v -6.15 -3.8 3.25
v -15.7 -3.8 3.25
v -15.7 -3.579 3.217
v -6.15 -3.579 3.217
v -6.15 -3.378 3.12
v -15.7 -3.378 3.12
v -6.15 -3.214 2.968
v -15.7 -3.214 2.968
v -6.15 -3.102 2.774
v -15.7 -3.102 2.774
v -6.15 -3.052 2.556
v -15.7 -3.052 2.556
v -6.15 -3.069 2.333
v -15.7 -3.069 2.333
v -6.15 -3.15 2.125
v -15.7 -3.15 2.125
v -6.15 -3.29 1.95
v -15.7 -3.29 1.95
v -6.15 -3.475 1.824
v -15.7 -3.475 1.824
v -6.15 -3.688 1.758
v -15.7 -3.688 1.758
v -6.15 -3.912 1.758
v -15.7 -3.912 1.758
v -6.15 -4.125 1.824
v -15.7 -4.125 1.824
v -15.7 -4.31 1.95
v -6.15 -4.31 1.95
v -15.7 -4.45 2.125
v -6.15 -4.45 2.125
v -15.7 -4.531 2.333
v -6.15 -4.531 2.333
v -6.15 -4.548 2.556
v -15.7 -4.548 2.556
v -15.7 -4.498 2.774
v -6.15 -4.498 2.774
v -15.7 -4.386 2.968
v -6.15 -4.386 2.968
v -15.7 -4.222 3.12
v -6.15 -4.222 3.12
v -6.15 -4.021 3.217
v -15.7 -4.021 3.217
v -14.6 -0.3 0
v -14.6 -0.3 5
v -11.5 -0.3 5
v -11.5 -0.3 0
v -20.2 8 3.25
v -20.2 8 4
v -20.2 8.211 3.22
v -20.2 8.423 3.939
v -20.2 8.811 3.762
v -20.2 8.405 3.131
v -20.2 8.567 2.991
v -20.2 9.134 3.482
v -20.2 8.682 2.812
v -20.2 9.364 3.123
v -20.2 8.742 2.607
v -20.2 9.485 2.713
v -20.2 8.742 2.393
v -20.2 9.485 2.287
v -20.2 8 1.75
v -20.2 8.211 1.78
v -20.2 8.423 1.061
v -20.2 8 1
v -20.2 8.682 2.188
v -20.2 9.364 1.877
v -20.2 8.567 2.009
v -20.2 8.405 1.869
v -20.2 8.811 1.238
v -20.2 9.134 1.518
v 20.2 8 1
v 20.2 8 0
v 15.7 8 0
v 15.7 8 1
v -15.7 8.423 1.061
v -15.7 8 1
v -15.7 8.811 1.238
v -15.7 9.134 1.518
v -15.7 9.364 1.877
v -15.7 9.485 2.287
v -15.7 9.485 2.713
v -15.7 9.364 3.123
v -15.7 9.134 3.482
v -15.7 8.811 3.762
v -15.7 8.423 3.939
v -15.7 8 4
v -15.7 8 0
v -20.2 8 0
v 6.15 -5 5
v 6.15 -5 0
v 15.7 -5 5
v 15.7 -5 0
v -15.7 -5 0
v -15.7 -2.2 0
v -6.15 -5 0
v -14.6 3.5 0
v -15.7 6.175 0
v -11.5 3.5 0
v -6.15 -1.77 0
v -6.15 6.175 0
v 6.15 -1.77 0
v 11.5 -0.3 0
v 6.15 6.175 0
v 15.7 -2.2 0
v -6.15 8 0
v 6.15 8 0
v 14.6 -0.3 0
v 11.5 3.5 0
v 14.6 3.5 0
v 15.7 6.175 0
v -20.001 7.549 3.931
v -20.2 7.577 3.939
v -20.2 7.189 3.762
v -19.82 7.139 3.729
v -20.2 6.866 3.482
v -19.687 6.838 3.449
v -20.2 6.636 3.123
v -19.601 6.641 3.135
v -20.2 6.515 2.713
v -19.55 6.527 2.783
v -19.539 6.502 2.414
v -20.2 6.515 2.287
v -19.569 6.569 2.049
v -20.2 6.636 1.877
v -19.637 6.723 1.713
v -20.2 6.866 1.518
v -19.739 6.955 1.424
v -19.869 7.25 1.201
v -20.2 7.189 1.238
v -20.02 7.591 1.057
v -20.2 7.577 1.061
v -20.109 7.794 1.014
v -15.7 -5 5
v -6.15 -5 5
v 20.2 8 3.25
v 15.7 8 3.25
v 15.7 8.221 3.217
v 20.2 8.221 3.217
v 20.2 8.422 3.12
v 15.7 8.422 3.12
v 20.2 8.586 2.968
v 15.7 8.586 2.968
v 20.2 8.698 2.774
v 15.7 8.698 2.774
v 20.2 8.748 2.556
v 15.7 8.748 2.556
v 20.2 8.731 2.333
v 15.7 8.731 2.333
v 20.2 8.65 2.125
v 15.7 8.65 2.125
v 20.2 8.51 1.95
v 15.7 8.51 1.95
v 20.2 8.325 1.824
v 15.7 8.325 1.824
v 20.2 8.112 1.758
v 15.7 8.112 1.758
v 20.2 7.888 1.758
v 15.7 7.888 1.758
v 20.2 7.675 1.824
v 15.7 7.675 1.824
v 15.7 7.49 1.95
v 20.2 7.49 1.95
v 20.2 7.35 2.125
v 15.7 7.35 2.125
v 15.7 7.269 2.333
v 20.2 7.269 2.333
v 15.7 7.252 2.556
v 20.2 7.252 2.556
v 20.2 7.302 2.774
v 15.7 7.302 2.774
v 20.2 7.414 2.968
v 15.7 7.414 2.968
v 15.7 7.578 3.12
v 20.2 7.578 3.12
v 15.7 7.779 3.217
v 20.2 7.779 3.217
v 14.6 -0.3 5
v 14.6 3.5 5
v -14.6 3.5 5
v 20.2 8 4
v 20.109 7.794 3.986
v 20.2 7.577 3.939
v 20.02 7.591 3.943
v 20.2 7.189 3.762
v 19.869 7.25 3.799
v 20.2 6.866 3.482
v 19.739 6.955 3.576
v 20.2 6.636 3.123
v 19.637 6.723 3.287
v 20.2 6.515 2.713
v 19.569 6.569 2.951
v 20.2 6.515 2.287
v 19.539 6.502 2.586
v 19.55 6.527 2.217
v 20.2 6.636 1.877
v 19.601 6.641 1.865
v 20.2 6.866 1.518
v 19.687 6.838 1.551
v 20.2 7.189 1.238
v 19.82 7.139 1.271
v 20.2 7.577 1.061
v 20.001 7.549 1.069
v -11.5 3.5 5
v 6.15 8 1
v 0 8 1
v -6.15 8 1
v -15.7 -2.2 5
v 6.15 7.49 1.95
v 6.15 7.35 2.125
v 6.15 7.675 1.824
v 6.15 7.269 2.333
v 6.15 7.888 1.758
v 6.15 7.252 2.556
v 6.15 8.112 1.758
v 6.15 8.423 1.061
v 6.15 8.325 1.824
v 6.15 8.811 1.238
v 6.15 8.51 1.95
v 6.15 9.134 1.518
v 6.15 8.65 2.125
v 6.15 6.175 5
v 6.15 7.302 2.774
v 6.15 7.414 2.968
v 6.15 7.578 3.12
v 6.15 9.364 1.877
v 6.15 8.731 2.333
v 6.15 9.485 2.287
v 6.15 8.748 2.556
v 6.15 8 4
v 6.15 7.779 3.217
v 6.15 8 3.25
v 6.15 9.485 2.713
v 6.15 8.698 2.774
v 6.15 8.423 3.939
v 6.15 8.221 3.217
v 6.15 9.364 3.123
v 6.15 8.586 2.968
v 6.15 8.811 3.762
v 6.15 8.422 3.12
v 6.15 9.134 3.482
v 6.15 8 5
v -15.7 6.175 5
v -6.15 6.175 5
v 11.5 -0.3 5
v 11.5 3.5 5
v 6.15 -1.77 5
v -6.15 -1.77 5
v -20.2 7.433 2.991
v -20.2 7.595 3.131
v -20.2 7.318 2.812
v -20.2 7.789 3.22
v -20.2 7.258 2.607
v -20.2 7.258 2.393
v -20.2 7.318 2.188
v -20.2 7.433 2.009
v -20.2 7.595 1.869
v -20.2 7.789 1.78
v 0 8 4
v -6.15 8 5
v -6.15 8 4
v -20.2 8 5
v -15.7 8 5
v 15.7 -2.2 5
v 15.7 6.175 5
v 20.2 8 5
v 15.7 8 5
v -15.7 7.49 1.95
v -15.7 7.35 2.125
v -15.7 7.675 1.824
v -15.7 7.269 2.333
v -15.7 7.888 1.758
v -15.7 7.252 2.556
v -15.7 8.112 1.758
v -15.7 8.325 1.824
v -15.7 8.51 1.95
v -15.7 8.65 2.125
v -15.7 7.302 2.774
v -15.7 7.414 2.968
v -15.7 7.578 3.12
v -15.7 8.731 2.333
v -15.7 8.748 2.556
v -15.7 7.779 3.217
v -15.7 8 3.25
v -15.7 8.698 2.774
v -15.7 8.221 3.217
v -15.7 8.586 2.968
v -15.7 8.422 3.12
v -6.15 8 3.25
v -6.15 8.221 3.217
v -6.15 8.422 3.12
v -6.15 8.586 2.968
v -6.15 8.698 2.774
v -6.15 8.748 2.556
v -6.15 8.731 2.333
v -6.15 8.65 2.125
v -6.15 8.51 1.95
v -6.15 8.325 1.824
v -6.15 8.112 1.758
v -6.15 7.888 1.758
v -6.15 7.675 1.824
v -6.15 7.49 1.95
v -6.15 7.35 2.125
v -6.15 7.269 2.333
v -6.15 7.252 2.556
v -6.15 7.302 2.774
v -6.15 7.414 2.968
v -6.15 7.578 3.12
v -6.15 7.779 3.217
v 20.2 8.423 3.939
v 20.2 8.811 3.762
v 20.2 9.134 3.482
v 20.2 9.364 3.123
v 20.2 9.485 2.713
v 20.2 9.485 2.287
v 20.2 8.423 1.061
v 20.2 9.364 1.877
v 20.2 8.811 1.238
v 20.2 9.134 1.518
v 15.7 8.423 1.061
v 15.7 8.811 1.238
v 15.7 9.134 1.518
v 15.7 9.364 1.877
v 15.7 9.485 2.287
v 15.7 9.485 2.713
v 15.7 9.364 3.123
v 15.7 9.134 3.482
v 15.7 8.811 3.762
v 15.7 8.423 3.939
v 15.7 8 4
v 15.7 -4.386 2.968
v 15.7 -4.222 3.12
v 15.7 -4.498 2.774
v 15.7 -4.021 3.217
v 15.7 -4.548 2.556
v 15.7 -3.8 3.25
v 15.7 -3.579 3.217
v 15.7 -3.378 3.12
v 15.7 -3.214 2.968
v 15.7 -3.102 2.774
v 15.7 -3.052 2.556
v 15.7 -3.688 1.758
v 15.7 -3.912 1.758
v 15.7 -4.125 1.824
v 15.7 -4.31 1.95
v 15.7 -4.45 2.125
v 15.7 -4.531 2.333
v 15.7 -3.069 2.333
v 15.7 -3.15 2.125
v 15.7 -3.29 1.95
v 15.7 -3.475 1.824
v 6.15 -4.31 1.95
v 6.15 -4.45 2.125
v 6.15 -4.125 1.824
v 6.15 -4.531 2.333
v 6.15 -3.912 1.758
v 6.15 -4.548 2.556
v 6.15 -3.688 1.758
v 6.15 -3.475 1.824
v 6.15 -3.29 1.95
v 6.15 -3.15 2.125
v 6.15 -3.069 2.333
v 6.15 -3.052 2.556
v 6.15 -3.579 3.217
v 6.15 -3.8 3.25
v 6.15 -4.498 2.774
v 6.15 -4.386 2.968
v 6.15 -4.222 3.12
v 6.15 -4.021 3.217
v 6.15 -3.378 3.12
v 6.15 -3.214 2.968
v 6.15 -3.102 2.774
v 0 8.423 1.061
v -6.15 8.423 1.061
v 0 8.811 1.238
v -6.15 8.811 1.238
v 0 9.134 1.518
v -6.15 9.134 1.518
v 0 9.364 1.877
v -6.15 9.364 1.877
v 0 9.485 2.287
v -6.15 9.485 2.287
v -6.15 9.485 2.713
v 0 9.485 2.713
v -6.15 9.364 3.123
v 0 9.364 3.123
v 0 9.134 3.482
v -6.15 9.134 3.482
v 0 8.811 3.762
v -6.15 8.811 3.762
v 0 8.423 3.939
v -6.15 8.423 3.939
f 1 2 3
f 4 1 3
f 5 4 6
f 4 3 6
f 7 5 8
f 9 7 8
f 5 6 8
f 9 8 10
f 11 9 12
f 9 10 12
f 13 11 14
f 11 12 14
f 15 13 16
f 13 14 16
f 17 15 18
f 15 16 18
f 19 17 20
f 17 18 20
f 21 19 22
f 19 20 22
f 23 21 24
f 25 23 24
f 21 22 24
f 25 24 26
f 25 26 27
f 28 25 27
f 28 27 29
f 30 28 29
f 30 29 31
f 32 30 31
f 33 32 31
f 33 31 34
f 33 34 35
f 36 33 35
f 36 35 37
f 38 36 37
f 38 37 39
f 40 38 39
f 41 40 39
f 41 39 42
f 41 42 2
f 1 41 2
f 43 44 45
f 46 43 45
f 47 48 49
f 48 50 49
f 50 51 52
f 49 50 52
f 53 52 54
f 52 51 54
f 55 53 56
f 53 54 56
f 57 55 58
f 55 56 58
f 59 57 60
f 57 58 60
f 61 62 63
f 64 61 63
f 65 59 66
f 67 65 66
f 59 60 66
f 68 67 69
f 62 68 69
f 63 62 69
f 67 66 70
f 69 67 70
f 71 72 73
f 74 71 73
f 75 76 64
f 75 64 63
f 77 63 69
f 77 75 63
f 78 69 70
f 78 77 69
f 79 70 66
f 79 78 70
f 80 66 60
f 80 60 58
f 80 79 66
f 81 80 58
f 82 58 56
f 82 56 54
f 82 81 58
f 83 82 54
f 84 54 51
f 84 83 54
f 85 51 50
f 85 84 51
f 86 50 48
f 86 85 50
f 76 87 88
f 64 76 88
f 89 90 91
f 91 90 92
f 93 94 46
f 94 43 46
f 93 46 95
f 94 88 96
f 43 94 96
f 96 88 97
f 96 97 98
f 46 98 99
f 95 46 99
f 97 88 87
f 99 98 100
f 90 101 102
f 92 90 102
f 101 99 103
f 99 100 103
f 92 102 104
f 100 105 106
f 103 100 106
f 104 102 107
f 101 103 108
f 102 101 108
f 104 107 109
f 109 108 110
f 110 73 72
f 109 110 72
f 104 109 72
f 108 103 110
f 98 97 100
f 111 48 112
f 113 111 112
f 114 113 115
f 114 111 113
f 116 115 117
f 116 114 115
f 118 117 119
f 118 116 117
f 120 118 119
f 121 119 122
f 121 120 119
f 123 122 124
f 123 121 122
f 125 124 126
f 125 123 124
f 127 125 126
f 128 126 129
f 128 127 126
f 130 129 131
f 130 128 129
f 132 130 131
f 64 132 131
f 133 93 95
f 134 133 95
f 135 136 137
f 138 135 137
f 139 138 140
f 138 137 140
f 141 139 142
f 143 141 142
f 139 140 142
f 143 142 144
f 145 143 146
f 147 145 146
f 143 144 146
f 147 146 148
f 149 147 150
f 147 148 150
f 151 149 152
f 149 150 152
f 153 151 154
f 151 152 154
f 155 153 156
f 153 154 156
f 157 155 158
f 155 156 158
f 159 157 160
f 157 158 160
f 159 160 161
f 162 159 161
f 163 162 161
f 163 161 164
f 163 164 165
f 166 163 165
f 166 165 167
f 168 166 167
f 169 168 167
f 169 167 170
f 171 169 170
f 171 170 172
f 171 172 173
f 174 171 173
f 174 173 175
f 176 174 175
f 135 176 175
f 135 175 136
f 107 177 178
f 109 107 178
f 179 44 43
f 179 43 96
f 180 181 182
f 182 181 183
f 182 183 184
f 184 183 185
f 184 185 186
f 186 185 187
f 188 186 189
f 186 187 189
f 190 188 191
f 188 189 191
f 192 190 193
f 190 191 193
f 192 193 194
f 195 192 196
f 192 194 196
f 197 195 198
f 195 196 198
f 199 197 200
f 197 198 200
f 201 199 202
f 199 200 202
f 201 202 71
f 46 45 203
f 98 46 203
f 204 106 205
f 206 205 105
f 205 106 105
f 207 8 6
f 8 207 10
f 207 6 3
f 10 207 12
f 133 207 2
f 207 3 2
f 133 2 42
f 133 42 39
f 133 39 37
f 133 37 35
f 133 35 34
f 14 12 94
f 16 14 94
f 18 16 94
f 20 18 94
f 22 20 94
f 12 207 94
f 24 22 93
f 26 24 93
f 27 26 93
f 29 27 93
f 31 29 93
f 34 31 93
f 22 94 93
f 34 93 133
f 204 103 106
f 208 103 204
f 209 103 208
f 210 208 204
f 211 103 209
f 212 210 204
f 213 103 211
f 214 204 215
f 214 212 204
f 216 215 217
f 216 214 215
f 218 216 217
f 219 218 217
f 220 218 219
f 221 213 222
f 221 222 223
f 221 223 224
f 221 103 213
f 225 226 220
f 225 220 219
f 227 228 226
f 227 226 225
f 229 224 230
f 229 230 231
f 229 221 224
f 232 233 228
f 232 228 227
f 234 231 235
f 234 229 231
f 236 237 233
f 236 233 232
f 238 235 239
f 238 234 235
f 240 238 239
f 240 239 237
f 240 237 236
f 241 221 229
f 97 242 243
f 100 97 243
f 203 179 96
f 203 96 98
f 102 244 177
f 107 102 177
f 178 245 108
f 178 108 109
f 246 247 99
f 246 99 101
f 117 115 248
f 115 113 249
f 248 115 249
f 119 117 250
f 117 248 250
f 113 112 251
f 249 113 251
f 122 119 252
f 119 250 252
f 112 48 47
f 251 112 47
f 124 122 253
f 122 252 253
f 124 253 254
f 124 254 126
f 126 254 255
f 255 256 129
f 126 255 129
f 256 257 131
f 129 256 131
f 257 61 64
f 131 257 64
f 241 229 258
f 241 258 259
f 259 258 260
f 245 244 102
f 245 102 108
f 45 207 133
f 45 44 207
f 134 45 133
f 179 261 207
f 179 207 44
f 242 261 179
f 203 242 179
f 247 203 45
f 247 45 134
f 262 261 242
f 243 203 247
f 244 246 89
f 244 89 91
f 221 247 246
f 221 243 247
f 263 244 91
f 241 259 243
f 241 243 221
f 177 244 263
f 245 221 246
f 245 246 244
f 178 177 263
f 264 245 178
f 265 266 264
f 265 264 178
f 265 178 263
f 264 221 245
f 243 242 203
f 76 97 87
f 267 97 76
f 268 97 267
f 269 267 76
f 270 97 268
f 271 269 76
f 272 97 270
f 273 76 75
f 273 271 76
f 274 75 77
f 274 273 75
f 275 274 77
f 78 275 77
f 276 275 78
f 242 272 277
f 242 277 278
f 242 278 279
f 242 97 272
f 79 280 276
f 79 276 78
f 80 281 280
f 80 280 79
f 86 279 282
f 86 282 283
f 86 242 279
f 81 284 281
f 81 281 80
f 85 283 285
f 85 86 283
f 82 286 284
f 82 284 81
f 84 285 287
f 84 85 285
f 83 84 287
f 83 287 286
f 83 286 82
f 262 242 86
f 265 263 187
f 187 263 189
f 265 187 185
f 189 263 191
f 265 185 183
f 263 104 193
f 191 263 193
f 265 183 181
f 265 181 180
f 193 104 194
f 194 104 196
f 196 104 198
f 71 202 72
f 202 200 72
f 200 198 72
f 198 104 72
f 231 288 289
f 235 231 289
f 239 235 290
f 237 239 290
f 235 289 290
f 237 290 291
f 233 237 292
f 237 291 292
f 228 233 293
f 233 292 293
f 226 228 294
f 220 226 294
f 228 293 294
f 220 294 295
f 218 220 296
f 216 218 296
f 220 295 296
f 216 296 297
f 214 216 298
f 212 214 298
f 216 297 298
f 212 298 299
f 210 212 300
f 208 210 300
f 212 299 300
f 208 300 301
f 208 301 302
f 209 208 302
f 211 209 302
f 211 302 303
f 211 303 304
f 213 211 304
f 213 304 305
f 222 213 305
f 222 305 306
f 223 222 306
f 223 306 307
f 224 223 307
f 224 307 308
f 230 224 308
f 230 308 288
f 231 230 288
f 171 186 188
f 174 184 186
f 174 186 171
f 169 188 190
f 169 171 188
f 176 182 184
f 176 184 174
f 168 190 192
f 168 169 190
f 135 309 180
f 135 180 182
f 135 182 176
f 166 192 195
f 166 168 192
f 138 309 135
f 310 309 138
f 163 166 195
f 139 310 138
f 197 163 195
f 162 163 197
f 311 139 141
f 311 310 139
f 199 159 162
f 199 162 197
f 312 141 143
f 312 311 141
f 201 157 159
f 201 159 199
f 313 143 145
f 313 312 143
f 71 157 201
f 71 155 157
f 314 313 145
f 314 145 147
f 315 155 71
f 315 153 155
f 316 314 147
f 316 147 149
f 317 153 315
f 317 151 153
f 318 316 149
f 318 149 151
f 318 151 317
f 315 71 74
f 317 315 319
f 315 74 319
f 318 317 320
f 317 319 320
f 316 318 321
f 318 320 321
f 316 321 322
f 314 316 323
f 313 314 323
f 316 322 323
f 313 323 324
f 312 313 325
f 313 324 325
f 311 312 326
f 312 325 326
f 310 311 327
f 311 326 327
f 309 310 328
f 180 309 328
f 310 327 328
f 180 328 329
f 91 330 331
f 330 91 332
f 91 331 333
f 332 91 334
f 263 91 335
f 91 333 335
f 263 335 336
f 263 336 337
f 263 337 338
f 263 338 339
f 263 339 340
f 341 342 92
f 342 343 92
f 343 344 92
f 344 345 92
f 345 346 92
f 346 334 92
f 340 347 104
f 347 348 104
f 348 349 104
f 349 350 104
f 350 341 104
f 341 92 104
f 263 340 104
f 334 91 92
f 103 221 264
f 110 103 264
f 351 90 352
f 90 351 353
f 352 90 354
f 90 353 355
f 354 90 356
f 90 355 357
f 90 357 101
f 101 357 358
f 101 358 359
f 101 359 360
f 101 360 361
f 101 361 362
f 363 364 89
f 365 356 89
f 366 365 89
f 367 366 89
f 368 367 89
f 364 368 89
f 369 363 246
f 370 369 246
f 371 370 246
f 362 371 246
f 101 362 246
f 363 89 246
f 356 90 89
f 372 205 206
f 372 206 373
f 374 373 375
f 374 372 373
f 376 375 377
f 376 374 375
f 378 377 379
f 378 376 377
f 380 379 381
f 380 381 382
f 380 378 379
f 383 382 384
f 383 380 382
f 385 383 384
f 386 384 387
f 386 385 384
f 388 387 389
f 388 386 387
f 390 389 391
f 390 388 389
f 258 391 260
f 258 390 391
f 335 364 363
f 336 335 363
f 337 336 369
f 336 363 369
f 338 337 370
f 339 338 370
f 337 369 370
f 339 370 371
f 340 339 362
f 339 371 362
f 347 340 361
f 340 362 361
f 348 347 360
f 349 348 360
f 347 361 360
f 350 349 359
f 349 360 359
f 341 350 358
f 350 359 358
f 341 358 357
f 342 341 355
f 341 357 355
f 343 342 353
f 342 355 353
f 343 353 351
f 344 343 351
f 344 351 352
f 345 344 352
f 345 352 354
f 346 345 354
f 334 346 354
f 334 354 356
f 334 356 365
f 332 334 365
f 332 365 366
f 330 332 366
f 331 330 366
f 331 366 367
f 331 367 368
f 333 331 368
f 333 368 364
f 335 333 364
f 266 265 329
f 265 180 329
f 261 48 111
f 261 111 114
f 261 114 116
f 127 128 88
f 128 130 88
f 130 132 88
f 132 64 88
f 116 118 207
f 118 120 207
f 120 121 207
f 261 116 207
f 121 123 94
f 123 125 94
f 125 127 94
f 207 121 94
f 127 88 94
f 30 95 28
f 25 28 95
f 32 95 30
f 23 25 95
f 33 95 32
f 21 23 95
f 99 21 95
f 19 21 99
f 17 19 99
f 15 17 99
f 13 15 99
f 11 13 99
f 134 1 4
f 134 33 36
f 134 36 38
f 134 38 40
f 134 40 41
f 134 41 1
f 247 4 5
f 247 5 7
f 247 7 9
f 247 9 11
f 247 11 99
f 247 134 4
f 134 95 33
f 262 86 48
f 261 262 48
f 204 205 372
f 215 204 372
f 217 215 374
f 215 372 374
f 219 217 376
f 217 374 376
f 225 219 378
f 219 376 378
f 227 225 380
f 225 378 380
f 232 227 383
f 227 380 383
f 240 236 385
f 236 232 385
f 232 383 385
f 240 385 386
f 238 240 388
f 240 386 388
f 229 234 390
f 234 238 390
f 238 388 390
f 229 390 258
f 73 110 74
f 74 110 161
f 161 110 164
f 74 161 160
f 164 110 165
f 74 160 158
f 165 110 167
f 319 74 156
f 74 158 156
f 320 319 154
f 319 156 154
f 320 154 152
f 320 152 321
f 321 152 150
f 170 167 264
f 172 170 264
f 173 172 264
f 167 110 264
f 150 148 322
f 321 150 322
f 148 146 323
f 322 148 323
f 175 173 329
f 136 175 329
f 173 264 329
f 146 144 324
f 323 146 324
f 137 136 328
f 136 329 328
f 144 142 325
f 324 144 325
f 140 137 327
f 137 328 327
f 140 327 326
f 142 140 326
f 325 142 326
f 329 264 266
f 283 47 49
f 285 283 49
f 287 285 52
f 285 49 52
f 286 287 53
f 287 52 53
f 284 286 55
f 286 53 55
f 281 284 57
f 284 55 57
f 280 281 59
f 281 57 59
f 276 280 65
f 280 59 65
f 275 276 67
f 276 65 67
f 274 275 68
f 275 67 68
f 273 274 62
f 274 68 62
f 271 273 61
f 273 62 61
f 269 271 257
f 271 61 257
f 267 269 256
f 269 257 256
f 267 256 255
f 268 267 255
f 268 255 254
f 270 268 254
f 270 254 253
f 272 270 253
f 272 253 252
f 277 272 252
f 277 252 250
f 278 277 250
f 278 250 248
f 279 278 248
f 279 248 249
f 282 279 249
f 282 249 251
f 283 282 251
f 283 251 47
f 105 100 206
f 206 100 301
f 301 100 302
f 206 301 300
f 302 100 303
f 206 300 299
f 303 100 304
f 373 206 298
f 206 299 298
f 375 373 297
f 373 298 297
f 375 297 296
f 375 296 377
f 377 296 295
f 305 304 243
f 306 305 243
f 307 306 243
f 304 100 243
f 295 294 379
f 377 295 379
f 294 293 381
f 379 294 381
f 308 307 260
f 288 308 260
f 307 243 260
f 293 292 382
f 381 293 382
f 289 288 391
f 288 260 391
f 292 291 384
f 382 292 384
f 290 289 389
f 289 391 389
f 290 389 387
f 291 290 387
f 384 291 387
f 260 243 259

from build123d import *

# Parameters (mm, degrees)
SKETCH_1_W           = 31.4
SKETCH_1_H           = 10
SKETCH_1_H_2         = 3
EXTRUDE_1_DEPTH      = 5
SKETCH_2_W           = 3.1
SKETCH_2_H           = 3.8
CUT_EXTRUDE_1_DEPTH  = 6
SKETCH_3_R           = 1.5
EXTRUDE_2_DEPTH      = 20.2
EXTRUDE_2_DEPTH_BACK = 20.2
SKETCH_5_W           = 9.55
SKETCH_5_H           = 3.6506089
SKETCH_5_W_2         = 12.3
SKETCH_5_H_2         = 6.45906725
CUT_EXTRUDE_2_DEPTH  = 5
SKETCH_6_R           = 0.75
CUT_EXTRUDE_3_DEPTH  = 41.4


with BuildPart() as part:
    # 草图1 → 凸台-拉伸1 (new body)
    with BuildSketch(Plane.XY):
        Rectangle(SKETCH_1_W, SKETCH_1_H)
        with Locations((0, 6.5)):
            Rectangle(SKETCH_1_W, SKETCH_1_H_2)
        Polygon((-15.7, 8), (-20.2, 8), (-15.7, -2.2), (-15.7, 5), align=None)
        Polygon((20.2, 8), (15.7, 8), (15.7, 5), (15.7, -2.2), align=None)
    extrude(amount=EXTRUDE_1_DEPTH)

    # 草图2 → 切除-拉伸1 (cut, through all)
    with BuildSketch(Plane.XY.offset(5)):
        with Locations((-13.05, 1.6)):
            Rectangle(SKETCH_2_W, SKETCH_2_H)
        with Locations((13.05, 1.6)):
            Rectangle(SKETCH_2_W, SKETCH_2_H)
    extrude(amount=-CUT_EXTRUDE_1_DEPTH, mode=Mode.SUBTRACT)

    # 草图3 → 凸台-拉伸2 (add, two sides)
    with BuildSketch(Plane(origin=(0, 0, 0), x_dir=(0, 0, -1), z_dir=(1, 0, 0))) as extrude_2_sk:
        with Locations((-2.5, 8)):
            Circle(SKETCH_3_R)
    extrude(amount=EXTRUDE_2_DEPTH)
    extrude(extrude_2_sk.sketch, amount=-EXTRUDE_2_DEPTH_BACK)

    # 草图5 → 切除-拉伸2 (cut)
    with BuildSketch(Plane.XY.offset(5)):
        with Locations((-10.925, 8)):
            Rectangle(SKETCH_5_W, SKETCH_5_H)
        with Locations((10.925, 8)):
            Rectangle(SKETCH_5_W, SKETCH_5_H)
        with Locations((0, -5)):
            Rectangle(SKETCH_5_W_2, SKETCH_5_H_2)
    extrude(amount=-CUT_EXTRUDE_2_DEPTH, mode=Mode.SUBTRACT)

    # 草图6 → 切除-拉伸3 (cut, through all)
    with BuildSketch(Plane.ZY.offset(20.2)):
        with Locations((2.5, 8)):
            Circle(SKETCH_6_R)
        with Locations((2.5, -3.8)):
            Circle(SKETCH_6_R)
    extrude(amount=-CUT_EXTRUDE_3_DEPTH, mode=Mode.SUBTRACT)


solid = part.part
